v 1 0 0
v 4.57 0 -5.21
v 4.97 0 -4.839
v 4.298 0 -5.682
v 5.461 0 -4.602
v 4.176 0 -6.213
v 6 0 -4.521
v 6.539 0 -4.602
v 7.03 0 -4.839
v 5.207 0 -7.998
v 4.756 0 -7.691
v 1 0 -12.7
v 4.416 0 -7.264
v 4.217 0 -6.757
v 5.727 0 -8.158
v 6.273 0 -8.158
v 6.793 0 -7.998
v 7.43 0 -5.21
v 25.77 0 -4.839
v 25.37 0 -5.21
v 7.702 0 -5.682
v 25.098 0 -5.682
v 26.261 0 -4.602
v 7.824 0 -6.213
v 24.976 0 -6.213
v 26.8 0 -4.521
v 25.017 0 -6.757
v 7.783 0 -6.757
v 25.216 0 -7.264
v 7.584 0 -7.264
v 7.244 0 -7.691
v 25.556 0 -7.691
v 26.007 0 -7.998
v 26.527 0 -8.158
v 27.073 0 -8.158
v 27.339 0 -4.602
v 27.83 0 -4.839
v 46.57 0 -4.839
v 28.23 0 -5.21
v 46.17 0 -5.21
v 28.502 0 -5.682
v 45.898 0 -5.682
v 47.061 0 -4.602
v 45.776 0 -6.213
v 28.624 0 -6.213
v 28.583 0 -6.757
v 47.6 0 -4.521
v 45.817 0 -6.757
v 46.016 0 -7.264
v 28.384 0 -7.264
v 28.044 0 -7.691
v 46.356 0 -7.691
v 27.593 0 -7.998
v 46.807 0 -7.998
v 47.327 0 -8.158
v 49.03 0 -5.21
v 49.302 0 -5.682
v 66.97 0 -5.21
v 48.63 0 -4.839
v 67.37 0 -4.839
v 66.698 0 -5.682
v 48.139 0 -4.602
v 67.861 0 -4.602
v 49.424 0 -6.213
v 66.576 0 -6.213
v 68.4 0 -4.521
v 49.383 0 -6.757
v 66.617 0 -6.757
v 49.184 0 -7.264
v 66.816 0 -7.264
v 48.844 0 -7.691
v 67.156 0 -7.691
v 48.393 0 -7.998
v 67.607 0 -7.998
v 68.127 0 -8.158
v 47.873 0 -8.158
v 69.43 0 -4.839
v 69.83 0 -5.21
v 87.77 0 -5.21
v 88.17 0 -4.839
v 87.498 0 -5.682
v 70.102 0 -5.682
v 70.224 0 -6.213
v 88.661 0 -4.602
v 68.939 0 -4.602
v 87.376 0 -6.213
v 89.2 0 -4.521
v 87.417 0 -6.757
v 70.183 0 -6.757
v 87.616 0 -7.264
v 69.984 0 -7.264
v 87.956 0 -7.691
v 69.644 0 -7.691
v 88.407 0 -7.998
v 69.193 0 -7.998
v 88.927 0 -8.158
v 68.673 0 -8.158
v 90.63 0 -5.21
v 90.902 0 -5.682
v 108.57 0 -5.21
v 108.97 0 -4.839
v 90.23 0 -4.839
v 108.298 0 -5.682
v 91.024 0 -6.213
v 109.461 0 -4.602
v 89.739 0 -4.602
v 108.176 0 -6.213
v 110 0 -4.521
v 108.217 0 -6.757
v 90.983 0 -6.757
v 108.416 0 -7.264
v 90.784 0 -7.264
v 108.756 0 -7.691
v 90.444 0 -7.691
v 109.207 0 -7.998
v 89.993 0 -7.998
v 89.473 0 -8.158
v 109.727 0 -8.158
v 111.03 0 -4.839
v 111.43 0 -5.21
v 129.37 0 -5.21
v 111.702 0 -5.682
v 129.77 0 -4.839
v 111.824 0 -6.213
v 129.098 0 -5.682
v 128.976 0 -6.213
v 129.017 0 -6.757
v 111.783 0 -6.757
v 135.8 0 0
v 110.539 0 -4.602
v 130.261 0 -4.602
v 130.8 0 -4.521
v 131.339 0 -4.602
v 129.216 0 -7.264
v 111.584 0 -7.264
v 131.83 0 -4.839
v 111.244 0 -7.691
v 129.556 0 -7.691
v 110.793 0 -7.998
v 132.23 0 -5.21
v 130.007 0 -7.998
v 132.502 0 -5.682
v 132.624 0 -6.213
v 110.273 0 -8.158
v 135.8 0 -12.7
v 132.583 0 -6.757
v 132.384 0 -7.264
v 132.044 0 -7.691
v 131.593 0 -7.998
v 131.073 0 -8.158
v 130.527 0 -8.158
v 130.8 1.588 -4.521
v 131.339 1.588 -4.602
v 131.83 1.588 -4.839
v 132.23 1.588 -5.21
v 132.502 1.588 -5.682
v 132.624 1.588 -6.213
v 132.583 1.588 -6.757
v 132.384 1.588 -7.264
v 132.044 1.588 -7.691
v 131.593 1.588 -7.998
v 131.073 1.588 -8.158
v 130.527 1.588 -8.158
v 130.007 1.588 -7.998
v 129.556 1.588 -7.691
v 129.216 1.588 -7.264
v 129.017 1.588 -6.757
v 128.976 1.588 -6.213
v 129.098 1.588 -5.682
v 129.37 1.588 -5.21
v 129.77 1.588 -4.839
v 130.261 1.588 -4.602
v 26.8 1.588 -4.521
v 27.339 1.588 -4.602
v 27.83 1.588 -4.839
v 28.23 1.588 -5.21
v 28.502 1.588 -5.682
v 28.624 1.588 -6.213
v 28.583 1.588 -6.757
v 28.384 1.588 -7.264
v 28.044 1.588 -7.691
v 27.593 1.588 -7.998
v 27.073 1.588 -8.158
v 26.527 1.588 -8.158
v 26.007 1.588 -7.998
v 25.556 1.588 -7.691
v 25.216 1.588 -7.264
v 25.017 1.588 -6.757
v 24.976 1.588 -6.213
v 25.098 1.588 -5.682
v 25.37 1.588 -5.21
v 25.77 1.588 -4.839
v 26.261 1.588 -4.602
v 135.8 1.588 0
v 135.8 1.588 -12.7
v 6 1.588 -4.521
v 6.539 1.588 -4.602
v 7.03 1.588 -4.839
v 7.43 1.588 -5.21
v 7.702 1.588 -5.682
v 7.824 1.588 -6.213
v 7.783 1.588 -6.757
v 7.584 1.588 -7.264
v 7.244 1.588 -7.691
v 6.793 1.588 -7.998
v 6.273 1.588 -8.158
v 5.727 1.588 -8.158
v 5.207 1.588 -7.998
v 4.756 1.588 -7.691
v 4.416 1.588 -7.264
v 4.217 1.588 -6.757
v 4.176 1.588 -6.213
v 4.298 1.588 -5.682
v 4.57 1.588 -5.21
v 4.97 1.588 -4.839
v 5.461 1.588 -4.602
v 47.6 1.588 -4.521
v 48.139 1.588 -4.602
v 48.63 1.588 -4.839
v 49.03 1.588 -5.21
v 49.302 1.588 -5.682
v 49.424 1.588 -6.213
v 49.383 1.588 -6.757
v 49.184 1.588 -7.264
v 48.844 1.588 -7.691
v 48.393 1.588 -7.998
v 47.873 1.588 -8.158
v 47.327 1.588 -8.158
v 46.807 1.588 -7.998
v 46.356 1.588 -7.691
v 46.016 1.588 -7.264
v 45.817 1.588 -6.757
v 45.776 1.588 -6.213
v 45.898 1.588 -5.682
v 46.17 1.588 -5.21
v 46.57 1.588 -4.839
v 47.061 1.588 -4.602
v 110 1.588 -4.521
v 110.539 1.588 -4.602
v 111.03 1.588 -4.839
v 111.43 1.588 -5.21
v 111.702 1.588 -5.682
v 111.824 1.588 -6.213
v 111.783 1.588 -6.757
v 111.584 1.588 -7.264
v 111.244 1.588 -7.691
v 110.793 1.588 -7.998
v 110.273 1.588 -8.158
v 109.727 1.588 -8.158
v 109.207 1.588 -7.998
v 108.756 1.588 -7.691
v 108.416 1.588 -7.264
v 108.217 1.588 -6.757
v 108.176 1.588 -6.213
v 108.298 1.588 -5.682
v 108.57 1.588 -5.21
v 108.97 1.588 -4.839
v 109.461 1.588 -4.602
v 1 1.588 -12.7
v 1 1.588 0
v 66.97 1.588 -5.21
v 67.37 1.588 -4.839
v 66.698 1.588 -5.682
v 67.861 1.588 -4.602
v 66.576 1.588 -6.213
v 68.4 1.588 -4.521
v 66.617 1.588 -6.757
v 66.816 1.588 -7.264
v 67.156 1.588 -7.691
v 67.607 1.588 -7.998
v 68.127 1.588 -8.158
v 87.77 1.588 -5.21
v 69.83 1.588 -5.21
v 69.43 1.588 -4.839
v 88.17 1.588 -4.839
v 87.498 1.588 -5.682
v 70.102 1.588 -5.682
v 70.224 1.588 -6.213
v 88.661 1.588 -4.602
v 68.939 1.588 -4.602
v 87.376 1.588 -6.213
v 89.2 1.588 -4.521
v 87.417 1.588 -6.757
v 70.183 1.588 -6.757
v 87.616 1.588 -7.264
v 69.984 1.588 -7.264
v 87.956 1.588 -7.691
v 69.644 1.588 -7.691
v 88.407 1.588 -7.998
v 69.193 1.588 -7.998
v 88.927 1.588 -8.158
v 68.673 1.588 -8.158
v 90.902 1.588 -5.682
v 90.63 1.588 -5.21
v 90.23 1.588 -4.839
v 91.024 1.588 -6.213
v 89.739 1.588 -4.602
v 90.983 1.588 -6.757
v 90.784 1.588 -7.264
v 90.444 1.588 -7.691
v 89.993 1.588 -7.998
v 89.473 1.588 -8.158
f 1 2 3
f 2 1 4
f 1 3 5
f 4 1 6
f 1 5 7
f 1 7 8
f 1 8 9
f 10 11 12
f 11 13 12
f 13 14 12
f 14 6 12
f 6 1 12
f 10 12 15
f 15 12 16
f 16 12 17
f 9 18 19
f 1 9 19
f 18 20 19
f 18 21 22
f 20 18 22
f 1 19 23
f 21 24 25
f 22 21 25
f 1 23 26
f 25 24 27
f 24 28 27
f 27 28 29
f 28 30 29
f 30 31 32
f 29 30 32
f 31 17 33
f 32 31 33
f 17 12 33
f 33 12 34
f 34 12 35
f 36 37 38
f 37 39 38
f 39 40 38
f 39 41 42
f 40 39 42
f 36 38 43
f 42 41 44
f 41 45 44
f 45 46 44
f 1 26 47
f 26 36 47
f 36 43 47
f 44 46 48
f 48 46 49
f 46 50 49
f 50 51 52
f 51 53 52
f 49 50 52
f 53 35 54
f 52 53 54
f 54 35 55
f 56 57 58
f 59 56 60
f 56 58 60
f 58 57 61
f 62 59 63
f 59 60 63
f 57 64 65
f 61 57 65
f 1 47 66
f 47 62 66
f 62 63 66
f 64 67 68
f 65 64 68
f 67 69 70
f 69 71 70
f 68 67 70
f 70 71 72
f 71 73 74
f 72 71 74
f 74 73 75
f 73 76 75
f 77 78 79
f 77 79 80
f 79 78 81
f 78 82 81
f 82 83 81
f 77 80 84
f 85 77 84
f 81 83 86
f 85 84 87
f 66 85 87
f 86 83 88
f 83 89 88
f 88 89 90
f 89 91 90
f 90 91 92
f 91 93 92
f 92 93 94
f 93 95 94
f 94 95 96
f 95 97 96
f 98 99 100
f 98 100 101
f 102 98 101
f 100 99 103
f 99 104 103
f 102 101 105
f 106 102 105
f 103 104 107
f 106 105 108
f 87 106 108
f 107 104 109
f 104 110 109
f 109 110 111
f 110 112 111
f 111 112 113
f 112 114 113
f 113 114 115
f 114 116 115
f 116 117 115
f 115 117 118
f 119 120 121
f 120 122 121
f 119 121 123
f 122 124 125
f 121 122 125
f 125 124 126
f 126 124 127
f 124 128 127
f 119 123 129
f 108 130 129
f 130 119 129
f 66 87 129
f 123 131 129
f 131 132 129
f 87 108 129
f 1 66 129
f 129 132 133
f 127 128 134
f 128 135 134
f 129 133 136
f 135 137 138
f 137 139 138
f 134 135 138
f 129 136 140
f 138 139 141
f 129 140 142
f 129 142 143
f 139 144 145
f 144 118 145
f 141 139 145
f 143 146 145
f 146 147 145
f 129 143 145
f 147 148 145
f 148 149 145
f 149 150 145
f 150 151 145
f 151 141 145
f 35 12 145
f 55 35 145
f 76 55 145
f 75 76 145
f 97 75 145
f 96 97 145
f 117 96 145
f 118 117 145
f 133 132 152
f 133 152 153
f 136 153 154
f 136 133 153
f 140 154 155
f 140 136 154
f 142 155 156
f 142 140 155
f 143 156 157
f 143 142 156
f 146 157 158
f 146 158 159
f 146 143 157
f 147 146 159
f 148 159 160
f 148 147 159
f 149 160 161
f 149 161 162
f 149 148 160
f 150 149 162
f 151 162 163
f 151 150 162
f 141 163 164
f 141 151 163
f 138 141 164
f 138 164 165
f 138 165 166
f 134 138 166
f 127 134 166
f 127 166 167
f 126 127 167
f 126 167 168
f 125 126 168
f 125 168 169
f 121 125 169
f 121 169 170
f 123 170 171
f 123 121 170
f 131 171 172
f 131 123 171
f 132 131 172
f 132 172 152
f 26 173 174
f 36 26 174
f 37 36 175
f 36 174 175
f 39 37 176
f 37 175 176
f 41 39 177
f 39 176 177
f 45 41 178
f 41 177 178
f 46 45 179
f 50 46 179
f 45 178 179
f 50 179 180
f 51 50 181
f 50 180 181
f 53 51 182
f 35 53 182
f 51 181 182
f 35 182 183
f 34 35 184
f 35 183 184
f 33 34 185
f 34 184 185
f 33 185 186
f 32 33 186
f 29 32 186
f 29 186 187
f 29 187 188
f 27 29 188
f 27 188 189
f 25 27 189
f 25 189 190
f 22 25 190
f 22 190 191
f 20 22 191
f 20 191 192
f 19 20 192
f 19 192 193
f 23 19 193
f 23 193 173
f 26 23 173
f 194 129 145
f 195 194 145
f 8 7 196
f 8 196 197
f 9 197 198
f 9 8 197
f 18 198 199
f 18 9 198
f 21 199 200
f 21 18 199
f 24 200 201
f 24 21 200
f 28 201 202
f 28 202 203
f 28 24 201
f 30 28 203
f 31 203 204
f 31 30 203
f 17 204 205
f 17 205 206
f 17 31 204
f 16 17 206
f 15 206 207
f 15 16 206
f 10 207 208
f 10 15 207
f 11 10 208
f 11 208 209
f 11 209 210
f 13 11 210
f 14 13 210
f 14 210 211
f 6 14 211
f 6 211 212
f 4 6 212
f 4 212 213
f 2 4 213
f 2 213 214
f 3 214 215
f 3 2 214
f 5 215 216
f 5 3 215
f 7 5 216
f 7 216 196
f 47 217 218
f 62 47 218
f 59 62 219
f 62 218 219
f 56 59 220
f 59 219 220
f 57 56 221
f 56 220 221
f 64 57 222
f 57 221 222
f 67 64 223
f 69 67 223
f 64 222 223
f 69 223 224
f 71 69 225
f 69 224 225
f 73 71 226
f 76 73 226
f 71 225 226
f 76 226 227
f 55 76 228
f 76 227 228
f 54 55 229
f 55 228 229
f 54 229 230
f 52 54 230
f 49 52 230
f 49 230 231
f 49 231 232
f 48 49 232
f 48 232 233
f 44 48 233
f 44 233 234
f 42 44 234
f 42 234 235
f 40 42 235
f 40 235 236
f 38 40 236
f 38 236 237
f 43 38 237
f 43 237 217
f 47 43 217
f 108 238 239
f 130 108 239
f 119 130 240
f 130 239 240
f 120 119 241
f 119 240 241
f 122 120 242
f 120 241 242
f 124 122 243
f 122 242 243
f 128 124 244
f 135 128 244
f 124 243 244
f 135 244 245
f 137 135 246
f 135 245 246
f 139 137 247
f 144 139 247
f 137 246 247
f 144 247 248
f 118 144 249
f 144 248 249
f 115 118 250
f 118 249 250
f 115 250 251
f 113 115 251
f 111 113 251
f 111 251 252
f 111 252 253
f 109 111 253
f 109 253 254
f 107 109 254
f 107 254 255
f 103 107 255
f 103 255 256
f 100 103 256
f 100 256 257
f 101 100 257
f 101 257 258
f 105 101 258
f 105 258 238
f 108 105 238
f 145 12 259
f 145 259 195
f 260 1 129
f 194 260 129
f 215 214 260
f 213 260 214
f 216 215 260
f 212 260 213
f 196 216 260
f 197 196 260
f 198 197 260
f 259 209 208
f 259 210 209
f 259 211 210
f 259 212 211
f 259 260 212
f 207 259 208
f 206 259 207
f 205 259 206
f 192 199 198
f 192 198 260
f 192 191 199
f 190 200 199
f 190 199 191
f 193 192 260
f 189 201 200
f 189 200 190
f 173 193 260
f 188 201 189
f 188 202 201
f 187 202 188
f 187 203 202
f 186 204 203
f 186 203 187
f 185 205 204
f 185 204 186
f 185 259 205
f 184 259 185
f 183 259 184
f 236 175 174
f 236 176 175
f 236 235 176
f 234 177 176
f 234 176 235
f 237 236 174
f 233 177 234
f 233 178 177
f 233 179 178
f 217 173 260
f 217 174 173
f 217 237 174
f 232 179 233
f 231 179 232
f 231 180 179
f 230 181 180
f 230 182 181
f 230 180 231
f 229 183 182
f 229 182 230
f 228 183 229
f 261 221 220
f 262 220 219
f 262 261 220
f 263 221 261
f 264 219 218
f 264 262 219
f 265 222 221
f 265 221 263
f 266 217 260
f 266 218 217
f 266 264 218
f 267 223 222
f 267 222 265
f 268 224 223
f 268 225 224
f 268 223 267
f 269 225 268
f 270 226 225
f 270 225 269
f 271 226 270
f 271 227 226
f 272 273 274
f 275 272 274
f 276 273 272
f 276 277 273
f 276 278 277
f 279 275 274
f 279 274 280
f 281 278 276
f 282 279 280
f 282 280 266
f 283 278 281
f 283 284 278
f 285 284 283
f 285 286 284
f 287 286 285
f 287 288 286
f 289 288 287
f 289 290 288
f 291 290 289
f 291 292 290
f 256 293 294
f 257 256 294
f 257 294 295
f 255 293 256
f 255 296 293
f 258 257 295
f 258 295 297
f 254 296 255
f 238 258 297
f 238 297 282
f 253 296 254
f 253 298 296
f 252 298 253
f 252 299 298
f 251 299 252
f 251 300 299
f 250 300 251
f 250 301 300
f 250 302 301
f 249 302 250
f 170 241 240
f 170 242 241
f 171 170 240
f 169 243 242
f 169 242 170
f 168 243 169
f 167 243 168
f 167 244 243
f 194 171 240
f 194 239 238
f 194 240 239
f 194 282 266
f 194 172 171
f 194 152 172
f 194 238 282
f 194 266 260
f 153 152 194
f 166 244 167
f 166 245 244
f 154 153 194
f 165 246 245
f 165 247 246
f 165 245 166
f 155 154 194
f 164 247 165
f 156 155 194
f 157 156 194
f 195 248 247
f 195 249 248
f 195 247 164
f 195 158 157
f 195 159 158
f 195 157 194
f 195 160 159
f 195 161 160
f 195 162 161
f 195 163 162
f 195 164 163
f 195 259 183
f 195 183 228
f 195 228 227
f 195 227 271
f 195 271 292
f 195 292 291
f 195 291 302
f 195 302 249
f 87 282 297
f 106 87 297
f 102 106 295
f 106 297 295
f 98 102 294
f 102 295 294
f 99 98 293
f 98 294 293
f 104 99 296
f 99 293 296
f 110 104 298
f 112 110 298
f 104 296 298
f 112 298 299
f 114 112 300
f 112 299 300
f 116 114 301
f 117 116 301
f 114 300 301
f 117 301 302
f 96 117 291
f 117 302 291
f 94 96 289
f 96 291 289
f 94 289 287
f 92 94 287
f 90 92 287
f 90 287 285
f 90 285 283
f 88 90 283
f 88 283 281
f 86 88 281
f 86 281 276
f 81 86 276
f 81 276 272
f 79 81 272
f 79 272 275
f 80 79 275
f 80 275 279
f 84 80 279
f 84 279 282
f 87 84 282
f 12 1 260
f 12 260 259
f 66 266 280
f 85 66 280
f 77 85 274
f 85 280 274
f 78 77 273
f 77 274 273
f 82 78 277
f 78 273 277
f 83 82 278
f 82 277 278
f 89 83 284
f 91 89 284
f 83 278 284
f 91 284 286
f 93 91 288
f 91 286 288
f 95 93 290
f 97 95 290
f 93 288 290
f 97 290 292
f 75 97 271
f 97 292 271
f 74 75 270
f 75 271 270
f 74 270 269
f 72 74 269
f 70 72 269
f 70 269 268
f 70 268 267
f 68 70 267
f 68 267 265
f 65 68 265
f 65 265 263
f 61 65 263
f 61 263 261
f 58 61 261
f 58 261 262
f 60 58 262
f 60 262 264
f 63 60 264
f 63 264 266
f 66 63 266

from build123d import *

# Parameters (mm, degrees)
SKETCH1_W           = 134.8
SKETCH1_H           = 12.7
SKETCH1_R           = 1.8288
BOSS_EXTRUDE1_DEPTH = 1.5875
SKETCH2_R           = 1.8288
CUT_EXTRUDE1_DEPTH  = 137.401796749


with BuildPart() as part:
    # Sketch1 → Boss-Extrude1 (new body)
    with BuildSketch(Plane(origin=(0, 0, 0), x_dir=(1, 0, 0), z_dir=(0, 1, 0))):
        with Locations((68.4, 6.35)):
            Rectangle(SKETCH1_W, SKETCH1_H)
        with Locations(Location((6, 6.35, 0), (0, 0, 270))):
            Circle(SKETCH1_R, mode=Mode.SUBTRACT)
        with Locations(Location((130.8, 6.35, 0), (0, 0, 270))):
            Circle(SKETCH1_R, mode=Mode.SUBTRACT)
    extrude(amount=BOSS_EXTRUDE1_DEPTH)

    # Sketch2 → Cut-Extrude1 (cut, through all)
    with BuildSketch(Plane(origin=(0, 1.5875, 0), x_dir=(1, 0, 0), z_dir=(0, 1, 0))):
        with Locations(Location((26.8, 6.35, 0), (0, 0, 270))):
            Circle(SKETCH2_R)
        with Locations(Location((47.6, 6.35, 0), (0, 0, 270))):
            Circle(SKETCH2_R)
        with Locations(Location((68.4, 6.35, 0), (0, 0, 270))):
            Circle(SKETCH2_R)
        with Locations(Location((89.2, 6.35, 0), (0, 0, 270))):
            Circle(SKETCH2_R)
        with Locations(Location((110, 6.35, 0), (0, 0, 270))):
            Circle(SKETCH2_R)
    extrude(amount=-CUT_EXTRUDE1_DEPTH, mode=Mode.SUBTRACT)


solid = part.part
